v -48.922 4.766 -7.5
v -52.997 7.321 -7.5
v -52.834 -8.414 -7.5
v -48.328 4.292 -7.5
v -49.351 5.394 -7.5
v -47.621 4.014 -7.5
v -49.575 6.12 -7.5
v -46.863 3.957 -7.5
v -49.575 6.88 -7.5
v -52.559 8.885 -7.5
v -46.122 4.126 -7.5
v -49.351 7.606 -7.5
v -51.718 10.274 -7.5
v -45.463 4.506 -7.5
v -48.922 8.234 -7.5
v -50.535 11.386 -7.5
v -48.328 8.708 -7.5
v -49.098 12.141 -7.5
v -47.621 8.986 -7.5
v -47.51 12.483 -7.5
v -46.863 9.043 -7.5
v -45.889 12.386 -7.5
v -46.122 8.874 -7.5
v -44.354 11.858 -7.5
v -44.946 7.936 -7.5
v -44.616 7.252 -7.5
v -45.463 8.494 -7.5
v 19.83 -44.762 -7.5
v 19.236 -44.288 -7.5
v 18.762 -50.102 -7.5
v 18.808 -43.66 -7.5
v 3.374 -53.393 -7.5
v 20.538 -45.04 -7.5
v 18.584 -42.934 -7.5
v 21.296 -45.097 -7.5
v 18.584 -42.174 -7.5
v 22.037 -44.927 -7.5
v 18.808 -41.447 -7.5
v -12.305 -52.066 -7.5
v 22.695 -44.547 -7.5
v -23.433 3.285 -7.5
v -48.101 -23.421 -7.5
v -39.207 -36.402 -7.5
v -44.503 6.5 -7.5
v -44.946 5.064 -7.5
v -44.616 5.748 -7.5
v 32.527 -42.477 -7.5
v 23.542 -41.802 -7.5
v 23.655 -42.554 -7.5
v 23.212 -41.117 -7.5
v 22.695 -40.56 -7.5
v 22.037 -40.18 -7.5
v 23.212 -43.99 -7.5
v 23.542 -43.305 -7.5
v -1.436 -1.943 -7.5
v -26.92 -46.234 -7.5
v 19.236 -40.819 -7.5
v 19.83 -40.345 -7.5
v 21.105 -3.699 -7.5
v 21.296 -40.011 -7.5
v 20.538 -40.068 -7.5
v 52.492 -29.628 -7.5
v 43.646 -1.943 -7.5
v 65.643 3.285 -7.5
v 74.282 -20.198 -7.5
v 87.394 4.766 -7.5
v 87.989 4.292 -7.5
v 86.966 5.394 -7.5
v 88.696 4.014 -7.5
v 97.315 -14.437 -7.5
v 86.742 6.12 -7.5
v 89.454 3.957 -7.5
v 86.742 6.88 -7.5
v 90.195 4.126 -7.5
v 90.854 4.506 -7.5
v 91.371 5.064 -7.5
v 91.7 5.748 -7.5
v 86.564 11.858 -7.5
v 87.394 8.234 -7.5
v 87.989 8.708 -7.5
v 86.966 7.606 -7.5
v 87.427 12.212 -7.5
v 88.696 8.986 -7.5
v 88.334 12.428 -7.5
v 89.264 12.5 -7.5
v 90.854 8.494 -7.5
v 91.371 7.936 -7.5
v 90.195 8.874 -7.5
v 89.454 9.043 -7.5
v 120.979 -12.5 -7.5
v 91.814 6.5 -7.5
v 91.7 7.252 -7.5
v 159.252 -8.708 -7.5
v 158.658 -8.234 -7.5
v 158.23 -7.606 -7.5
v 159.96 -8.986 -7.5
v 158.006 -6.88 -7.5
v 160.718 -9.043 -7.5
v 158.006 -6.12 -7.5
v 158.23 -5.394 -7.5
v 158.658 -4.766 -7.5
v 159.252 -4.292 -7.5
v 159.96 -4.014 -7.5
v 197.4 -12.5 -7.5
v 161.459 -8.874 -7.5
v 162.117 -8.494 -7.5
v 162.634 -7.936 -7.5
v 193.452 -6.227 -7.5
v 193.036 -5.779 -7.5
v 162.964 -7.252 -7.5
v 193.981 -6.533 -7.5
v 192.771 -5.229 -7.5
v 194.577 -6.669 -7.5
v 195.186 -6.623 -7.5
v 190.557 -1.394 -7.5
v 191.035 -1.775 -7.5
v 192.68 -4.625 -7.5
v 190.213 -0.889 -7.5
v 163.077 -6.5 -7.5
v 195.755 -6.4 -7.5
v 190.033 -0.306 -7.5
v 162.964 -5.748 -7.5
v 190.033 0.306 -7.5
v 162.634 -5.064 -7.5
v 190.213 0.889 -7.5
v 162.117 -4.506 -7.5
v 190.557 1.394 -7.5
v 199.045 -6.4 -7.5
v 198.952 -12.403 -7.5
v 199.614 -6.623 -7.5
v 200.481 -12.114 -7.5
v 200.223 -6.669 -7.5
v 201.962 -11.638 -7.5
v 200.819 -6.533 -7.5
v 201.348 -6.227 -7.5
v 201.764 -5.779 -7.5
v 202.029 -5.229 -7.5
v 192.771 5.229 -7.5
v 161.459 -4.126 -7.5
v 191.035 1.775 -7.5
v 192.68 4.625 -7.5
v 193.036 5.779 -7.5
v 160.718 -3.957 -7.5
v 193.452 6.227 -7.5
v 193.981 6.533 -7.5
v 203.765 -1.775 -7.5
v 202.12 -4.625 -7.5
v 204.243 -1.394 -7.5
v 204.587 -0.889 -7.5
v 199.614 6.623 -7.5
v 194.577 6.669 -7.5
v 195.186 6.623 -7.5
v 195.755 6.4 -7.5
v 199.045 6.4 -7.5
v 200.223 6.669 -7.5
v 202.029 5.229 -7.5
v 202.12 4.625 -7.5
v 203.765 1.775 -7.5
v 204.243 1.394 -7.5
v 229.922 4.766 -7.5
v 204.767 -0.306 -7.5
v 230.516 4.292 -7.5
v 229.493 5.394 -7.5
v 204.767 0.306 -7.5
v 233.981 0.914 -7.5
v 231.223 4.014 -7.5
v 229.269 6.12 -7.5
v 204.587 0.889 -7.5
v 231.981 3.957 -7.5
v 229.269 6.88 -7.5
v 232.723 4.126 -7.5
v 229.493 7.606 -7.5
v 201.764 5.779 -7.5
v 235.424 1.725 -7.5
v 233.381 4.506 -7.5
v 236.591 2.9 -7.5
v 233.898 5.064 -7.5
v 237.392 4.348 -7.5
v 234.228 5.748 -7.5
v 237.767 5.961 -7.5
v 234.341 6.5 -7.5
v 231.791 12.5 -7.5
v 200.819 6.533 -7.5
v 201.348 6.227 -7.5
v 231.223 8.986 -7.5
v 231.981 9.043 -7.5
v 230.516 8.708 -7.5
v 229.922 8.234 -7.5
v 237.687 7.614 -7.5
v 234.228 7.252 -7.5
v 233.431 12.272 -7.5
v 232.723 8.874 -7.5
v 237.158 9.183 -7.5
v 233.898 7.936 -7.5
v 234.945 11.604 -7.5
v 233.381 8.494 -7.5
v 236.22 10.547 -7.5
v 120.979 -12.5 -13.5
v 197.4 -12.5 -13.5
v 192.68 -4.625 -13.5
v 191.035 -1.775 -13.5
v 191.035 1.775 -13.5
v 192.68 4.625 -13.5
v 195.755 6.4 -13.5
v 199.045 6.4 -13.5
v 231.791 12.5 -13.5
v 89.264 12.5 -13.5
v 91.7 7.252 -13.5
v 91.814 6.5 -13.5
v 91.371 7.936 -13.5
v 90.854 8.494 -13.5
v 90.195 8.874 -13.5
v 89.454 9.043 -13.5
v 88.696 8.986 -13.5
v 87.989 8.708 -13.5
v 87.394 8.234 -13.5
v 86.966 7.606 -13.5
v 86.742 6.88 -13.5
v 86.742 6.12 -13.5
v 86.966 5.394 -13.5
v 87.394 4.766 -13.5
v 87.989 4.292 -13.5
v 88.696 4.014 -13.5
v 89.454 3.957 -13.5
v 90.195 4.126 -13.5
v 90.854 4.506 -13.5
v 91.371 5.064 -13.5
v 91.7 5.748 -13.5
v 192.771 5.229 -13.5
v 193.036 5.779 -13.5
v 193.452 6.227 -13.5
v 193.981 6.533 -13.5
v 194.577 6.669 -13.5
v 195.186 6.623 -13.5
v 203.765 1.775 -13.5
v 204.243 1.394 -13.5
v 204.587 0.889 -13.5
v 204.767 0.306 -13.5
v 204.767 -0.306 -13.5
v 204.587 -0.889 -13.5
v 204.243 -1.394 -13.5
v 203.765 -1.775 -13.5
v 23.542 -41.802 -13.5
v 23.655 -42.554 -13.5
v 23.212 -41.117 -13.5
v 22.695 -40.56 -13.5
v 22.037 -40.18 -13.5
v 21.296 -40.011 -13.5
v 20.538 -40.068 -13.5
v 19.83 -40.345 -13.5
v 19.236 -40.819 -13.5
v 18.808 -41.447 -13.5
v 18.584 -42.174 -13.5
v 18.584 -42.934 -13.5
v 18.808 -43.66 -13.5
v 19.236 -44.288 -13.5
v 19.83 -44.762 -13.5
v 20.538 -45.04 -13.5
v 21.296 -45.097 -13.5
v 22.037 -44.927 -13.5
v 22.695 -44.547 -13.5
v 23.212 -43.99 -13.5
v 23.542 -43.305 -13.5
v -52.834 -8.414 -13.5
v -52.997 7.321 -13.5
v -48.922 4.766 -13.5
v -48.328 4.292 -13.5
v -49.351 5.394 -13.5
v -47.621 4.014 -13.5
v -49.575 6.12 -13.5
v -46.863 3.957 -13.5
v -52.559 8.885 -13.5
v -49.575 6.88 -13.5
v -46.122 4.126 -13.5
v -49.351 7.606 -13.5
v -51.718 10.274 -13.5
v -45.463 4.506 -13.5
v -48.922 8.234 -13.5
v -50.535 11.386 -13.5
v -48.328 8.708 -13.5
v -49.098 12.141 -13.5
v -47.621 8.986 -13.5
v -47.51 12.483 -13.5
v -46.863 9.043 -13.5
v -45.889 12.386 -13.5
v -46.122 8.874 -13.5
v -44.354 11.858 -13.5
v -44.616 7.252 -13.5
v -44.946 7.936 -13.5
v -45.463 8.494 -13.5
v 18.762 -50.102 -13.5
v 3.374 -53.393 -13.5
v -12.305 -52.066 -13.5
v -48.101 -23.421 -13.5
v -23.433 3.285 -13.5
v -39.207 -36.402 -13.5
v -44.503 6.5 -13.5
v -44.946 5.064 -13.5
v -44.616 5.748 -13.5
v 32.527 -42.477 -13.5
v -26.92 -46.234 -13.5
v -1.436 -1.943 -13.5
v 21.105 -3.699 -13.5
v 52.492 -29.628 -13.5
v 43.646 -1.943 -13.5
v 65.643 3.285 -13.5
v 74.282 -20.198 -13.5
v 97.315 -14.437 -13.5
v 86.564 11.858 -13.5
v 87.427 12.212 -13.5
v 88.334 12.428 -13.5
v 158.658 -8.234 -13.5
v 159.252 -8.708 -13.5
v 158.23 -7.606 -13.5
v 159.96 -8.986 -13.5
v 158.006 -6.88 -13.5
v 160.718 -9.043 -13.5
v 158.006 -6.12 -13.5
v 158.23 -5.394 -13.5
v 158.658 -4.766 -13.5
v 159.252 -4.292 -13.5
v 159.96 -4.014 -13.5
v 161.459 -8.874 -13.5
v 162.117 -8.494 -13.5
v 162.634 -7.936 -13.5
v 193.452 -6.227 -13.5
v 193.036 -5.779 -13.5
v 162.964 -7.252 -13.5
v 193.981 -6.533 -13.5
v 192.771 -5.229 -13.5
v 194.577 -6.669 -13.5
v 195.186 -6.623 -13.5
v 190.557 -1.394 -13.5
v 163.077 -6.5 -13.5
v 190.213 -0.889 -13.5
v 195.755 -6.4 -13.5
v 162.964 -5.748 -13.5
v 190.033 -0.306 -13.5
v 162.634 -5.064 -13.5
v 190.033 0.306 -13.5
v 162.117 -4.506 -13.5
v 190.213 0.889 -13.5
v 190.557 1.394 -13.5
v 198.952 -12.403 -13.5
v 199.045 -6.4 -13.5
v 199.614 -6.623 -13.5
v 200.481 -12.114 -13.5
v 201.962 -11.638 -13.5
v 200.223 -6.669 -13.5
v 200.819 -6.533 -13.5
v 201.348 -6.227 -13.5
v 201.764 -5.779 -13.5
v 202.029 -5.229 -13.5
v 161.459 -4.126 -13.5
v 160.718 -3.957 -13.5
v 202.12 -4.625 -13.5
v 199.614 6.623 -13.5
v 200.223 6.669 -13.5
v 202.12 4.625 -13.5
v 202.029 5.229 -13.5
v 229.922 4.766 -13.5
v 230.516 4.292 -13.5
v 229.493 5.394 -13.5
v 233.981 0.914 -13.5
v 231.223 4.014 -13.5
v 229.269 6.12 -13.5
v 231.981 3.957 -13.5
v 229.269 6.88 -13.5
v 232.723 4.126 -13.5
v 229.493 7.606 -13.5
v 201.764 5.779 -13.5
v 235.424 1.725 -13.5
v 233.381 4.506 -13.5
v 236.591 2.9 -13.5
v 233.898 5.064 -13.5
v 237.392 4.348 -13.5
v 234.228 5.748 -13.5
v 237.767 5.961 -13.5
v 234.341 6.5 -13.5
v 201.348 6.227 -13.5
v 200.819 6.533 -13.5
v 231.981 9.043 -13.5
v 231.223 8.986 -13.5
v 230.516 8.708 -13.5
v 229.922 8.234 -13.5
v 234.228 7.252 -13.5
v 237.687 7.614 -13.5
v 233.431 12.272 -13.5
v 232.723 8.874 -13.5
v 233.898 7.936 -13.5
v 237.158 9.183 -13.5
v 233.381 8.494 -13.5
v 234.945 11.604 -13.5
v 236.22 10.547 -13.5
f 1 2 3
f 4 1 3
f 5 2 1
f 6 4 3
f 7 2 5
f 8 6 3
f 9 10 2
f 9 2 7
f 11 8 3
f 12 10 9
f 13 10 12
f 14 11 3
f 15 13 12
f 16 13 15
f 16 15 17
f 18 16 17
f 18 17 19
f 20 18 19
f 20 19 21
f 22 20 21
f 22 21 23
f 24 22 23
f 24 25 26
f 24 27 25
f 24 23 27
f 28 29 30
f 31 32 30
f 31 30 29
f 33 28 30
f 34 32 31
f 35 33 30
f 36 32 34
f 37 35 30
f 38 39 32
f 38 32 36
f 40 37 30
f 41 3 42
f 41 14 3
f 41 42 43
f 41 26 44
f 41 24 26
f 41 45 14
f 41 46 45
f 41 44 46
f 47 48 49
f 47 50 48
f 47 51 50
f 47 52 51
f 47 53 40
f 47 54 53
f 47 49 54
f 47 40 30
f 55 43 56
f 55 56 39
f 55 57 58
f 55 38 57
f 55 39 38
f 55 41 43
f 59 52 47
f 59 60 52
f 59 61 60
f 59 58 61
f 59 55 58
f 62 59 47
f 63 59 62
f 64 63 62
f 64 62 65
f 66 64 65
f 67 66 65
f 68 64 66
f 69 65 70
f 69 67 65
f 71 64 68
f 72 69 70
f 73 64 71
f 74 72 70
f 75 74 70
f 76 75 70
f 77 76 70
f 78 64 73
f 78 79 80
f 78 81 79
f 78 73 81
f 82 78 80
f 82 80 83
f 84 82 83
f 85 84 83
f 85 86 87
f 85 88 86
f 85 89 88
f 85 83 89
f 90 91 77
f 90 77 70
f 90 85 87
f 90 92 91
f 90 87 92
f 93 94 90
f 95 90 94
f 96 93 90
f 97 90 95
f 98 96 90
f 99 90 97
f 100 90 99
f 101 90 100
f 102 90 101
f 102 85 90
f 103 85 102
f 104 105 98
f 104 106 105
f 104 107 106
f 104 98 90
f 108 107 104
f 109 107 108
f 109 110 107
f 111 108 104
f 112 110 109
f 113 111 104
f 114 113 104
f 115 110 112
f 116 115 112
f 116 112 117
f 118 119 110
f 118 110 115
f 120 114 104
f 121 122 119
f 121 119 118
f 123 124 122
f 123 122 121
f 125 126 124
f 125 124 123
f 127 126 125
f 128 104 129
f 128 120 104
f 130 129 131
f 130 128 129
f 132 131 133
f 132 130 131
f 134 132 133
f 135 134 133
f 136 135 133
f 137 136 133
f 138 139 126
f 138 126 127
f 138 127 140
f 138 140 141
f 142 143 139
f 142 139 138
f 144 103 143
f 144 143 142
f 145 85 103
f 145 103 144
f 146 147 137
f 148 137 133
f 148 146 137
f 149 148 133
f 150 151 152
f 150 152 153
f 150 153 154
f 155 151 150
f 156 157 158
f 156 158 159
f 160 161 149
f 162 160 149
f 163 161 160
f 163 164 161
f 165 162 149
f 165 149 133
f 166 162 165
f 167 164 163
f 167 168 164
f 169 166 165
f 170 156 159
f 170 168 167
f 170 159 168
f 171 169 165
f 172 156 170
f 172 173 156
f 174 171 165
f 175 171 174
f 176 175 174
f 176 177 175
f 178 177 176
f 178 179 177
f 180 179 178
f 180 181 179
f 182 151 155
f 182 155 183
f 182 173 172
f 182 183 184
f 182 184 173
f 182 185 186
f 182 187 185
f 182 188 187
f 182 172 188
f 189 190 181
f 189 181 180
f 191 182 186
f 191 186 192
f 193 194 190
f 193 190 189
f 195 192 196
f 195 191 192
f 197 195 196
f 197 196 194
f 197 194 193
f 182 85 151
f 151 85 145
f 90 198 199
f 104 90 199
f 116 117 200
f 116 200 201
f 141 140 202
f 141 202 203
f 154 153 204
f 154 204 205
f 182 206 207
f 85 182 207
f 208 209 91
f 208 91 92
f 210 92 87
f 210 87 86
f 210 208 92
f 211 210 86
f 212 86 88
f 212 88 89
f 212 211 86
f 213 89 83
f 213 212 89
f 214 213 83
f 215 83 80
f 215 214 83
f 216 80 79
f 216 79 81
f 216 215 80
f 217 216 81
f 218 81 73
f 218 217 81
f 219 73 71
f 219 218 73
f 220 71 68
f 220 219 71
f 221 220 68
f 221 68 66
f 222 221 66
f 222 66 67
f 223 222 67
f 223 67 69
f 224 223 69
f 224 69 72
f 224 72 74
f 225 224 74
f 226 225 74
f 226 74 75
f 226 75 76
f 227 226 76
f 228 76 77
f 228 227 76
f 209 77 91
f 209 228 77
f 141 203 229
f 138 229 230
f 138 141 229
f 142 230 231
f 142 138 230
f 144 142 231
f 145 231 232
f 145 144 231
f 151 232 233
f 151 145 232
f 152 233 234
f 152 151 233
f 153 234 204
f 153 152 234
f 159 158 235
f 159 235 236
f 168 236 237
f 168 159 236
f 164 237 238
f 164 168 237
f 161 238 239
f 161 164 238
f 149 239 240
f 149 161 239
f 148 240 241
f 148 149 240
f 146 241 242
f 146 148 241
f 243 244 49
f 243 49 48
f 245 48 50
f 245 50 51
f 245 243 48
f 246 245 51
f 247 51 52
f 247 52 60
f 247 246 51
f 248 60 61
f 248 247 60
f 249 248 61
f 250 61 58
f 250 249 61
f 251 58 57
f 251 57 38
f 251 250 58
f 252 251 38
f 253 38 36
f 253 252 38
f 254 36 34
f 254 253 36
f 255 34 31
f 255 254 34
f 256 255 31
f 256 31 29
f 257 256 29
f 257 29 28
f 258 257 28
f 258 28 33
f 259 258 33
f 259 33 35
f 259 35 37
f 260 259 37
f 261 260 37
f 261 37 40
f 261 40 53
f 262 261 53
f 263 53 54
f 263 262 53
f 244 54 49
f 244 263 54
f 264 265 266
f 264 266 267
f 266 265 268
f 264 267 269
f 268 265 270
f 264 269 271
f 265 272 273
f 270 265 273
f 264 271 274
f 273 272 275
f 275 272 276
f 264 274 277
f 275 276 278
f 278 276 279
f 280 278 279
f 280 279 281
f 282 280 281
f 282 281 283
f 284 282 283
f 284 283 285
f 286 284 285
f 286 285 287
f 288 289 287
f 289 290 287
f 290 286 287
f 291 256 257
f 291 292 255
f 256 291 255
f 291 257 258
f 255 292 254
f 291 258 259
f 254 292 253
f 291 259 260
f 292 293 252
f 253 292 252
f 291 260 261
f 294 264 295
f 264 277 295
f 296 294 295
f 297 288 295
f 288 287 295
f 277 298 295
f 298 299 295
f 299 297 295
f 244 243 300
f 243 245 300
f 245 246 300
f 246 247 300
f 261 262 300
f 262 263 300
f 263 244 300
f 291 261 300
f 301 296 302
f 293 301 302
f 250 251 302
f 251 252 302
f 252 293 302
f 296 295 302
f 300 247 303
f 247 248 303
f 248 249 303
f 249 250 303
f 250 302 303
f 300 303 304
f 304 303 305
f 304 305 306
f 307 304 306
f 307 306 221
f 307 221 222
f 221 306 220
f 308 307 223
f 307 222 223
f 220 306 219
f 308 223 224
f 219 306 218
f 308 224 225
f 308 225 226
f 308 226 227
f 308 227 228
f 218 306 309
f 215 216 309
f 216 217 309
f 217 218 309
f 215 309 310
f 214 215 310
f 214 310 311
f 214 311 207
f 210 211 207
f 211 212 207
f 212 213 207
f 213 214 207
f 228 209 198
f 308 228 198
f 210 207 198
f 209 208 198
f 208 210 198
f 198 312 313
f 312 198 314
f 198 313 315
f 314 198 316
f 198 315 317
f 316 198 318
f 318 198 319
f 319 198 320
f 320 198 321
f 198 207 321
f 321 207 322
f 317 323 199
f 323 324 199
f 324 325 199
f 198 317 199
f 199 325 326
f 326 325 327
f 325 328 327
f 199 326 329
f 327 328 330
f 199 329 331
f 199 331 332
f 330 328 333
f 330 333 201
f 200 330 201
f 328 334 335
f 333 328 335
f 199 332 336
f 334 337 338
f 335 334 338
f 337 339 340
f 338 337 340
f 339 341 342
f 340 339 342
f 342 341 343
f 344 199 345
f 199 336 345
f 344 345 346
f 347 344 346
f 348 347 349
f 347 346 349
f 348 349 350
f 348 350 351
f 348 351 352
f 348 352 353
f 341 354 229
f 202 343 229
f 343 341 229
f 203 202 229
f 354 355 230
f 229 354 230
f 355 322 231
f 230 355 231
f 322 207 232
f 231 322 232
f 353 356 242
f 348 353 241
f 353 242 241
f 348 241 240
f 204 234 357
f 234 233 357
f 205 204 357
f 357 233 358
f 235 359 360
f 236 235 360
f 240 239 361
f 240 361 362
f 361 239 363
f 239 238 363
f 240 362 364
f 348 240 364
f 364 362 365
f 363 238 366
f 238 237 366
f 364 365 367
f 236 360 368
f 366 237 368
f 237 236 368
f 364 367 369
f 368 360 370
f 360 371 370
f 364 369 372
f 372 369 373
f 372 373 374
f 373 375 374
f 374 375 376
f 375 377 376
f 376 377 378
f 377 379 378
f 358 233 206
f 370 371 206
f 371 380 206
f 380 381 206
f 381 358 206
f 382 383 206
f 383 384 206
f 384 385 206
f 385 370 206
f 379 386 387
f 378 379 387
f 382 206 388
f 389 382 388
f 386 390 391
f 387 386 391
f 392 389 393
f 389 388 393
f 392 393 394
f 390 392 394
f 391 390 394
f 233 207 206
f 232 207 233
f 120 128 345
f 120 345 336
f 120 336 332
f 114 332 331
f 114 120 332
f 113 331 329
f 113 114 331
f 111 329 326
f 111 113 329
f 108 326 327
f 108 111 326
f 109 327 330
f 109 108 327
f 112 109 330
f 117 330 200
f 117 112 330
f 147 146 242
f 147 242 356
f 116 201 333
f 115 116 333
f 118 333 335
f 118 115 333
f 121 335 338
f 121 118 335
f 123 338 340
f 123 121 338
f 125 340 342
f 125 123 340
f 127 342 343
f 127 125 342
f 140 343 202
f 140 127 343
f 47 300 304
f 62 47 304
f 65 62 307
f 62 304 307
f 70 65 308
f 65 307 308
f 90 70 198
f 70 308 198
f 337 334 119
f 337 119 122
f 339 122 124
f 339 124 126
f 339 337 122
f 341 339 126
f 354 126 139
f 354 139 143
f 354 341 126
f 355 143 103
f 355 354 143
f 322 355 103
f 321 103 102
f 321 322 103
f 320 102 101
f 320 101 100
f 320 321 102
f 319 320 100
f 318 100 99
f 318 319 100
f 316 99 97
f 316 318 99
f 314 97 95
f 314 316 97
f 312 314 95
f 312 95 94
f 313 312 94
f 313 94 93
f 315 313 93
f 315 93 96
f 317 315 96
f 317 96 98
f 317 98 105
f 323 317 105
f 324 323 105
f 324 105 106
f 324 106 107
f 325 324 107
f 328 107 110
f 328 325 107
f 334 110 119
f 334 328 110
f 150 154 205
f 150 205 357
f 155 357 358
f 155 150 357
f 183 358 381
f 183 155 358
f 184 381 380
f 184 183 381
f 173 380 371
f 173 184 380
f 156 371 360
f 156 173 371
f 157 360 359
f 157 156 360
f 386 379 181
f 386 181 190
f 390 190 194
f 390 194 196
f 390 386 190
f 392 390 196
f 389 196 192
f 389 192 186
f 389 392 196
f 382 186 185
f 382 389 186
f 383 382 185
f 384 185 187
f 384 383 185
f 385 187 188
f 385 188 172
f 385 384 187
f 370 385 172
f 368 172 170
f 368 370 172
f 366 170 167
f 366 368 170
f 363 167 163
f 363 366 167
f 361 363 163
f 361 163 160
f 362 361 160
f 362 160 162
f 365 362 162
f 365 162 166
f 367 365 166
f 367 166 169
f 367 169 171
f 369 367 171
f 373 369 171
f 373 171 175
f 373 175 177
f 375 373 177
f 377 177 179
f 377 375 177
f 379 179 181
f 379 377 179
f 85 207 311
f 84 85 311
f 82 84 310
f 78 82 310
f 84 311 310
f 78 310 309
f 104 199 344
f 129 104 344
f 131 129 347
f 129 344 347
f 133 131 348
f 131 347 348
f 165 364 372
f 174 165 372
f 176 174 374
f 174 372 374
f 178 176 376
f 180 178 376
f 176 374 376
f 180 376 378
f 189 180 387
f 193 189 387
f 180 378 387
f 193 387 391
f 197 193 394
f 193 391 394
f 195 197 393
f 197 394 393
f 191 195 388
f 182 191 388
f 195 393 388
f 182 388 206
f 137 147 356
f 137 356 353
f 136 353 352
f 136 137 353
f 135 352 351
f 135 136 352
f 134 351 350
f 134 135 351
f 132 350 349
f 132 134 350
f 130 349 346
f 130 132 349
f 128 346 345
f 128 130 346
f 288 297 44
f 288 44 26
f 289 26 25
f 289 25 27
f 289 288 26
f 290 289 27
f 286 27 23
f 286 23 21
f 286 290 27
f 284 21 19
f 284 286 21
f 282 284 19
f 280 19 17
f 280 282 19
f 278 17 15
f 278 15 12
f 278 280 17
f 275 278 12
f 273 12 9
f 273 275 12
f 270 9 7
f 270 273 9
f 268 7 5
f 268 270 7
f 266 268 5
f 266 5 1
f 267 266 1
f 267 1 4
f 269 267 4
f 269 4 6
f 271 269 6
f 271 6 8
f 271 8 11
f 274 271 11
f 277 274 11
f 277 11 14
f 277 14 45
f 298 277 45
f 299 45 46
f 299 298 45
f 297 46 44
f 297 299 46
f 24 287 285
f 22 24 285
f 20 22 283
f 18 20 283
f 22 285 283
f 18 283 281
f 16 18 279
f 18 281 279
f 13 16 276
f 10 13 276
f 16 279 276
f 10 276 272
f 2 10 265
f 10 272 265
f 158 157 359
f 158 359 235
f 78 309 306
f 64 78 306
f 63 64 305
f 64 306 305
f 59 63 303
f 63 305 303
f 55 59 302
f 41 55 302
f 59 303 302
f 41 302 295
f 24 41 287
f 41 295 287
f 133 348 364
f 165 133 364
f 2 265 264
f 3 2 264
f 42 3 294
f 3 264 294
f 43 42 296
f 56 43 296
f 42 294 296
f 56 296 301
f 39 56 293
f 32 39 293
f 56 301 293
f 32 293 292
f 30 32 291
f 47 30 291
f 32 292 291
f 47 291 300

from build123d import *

# Parameters (mm, degrees)
SKETCH4_R           = 2.55
SKETCH4_R_2         = 2.549999993
SKETCH4_R_3         = 6
BOSS_EXTRUDE1_DEPTH = 6
CUT_EXTRUDE1_DEPTH  = 10


with BuildPart() as part:
    # Sketch4 → Boss-Extrude1 (new body)
    with BuildSketch(Plane.XY.offset(-13.5)):
        with BuildLine():
            Line((197.399795586, 12.5), (89.263654418, 12.5))
            ThreePointArc((89.263654418, 12.5), (87.876262264, 12.337391799), (86.564070557, 11.858381004))
            ThreePointArc((86.564070557, 11.858381004), (21.105246497, -3.69943352), (-44.353577564, 11.858381004))
            ThreePointArc((-44.353577564, 11.858381004), (-49.84201029, 11.812468541), (-52.996718657, 7.321052632))
            ThreePointArc((-52.996718657, 7.321052632), (-26.920402355, -46.233558559), (32.526685027, -42.476637828))
            ThreePointArc((32.526685027, -42.476637828), (74.2820165, -20.197808109), (120.978886956, -12.5))
            Line((120.978886956, -12.5), (197.399795586, -12.5))
            ThreePointArc((197.399795586, -12.5), (199.721224158, -12.282547349), (201.961884602, -11.637755102))
            Line((201.961884602, -11.637755102), (233.980730892, 0.913877551))
            ThreePointArc((233.980730892, 0.913877551), (237.686550892, 7.614285714), (231.790928164, 12.5))
            Line((231.790928164, 12.5), (197.399795586, 12.5))
        make_face()
        with Locations((160.527291291, -6.5)):
            Circle(SKETCH4_R, mode=Mode.SUBTRACT)
        with Locations((89.263654418, 6.5)):
            Circle(SKETCH4_R_2, mode=Mode.SUBTRACT)
        with Locations((21.105246497, -42.553713943)):
            Circle(SKETCH4_R_2, mode=Mode.SUBTRACT)
        with Locations((-47.053161424, 6.5)):
            Circle(SKETCH4_R, mode=Mode.SUBTRACT)
        with Locations((197.399795586, 0)):
            Circle(SKETCH4_R_3, mode=Mode.SUBTRACT)
        with Locations((231.790928164, 6.5)):
            Circle(SKETCH4_R, mode=Mode.SUBTRACT)
    extrude(amount=BOSS_EXTRUDE1_DEPTH)

    # Sketch5 → Cut-Extrude1 (cut)
    with BuildSketch(Plane.XY.offset(-7.5)):
        with BuildLine():
            Line((191.03471214, 1.775352078), (192.679753863, 4.624647922))
            ThreePointArc((192.679753863, 4.624647922), (193.704753863, 6.4), (195.754753863, 6.4))
            Line((195.754753863, 6.4), (199.044837309, 6.4))
            ThreePointArc((199.044837309, 6.4), (201.094837309, 6.4), (202.119837309, 4.624647922))
            Line((202.119837309, 4.624647922), (203.764879032, 1.775352078))
            ThreePointArc((203.764879032, 1.775352078), (204.789879032, 0), (203.764879032, -1.775352078))
            Line((203.764879032, -1.775352078), (202.119837309, -4.624647922))
            ThreePointArc((202.119837309, -4.624647922), (201.094837309, -6.4), (199.044837309, -6.4))
            Line((199.044837309, -6.4), (195.754753863, -6.4))
            ThreePointArc((195.754753863, -6.4), (193.704753863, -6.4), (192.679753863, -4.624647922))
            Line((192.679753863, -4.624647922), (191.03471214, -1.775352078))
            ThreePointArc((191.03471214, -1.775352078), (190.00971214, 0), (191.03471214, 1.775352078))
        make_face()
    extrude(amount=-CUT_EXTRUDE1_DEPTH, mode=Mode.SUBTRACT)


solid = part.part
